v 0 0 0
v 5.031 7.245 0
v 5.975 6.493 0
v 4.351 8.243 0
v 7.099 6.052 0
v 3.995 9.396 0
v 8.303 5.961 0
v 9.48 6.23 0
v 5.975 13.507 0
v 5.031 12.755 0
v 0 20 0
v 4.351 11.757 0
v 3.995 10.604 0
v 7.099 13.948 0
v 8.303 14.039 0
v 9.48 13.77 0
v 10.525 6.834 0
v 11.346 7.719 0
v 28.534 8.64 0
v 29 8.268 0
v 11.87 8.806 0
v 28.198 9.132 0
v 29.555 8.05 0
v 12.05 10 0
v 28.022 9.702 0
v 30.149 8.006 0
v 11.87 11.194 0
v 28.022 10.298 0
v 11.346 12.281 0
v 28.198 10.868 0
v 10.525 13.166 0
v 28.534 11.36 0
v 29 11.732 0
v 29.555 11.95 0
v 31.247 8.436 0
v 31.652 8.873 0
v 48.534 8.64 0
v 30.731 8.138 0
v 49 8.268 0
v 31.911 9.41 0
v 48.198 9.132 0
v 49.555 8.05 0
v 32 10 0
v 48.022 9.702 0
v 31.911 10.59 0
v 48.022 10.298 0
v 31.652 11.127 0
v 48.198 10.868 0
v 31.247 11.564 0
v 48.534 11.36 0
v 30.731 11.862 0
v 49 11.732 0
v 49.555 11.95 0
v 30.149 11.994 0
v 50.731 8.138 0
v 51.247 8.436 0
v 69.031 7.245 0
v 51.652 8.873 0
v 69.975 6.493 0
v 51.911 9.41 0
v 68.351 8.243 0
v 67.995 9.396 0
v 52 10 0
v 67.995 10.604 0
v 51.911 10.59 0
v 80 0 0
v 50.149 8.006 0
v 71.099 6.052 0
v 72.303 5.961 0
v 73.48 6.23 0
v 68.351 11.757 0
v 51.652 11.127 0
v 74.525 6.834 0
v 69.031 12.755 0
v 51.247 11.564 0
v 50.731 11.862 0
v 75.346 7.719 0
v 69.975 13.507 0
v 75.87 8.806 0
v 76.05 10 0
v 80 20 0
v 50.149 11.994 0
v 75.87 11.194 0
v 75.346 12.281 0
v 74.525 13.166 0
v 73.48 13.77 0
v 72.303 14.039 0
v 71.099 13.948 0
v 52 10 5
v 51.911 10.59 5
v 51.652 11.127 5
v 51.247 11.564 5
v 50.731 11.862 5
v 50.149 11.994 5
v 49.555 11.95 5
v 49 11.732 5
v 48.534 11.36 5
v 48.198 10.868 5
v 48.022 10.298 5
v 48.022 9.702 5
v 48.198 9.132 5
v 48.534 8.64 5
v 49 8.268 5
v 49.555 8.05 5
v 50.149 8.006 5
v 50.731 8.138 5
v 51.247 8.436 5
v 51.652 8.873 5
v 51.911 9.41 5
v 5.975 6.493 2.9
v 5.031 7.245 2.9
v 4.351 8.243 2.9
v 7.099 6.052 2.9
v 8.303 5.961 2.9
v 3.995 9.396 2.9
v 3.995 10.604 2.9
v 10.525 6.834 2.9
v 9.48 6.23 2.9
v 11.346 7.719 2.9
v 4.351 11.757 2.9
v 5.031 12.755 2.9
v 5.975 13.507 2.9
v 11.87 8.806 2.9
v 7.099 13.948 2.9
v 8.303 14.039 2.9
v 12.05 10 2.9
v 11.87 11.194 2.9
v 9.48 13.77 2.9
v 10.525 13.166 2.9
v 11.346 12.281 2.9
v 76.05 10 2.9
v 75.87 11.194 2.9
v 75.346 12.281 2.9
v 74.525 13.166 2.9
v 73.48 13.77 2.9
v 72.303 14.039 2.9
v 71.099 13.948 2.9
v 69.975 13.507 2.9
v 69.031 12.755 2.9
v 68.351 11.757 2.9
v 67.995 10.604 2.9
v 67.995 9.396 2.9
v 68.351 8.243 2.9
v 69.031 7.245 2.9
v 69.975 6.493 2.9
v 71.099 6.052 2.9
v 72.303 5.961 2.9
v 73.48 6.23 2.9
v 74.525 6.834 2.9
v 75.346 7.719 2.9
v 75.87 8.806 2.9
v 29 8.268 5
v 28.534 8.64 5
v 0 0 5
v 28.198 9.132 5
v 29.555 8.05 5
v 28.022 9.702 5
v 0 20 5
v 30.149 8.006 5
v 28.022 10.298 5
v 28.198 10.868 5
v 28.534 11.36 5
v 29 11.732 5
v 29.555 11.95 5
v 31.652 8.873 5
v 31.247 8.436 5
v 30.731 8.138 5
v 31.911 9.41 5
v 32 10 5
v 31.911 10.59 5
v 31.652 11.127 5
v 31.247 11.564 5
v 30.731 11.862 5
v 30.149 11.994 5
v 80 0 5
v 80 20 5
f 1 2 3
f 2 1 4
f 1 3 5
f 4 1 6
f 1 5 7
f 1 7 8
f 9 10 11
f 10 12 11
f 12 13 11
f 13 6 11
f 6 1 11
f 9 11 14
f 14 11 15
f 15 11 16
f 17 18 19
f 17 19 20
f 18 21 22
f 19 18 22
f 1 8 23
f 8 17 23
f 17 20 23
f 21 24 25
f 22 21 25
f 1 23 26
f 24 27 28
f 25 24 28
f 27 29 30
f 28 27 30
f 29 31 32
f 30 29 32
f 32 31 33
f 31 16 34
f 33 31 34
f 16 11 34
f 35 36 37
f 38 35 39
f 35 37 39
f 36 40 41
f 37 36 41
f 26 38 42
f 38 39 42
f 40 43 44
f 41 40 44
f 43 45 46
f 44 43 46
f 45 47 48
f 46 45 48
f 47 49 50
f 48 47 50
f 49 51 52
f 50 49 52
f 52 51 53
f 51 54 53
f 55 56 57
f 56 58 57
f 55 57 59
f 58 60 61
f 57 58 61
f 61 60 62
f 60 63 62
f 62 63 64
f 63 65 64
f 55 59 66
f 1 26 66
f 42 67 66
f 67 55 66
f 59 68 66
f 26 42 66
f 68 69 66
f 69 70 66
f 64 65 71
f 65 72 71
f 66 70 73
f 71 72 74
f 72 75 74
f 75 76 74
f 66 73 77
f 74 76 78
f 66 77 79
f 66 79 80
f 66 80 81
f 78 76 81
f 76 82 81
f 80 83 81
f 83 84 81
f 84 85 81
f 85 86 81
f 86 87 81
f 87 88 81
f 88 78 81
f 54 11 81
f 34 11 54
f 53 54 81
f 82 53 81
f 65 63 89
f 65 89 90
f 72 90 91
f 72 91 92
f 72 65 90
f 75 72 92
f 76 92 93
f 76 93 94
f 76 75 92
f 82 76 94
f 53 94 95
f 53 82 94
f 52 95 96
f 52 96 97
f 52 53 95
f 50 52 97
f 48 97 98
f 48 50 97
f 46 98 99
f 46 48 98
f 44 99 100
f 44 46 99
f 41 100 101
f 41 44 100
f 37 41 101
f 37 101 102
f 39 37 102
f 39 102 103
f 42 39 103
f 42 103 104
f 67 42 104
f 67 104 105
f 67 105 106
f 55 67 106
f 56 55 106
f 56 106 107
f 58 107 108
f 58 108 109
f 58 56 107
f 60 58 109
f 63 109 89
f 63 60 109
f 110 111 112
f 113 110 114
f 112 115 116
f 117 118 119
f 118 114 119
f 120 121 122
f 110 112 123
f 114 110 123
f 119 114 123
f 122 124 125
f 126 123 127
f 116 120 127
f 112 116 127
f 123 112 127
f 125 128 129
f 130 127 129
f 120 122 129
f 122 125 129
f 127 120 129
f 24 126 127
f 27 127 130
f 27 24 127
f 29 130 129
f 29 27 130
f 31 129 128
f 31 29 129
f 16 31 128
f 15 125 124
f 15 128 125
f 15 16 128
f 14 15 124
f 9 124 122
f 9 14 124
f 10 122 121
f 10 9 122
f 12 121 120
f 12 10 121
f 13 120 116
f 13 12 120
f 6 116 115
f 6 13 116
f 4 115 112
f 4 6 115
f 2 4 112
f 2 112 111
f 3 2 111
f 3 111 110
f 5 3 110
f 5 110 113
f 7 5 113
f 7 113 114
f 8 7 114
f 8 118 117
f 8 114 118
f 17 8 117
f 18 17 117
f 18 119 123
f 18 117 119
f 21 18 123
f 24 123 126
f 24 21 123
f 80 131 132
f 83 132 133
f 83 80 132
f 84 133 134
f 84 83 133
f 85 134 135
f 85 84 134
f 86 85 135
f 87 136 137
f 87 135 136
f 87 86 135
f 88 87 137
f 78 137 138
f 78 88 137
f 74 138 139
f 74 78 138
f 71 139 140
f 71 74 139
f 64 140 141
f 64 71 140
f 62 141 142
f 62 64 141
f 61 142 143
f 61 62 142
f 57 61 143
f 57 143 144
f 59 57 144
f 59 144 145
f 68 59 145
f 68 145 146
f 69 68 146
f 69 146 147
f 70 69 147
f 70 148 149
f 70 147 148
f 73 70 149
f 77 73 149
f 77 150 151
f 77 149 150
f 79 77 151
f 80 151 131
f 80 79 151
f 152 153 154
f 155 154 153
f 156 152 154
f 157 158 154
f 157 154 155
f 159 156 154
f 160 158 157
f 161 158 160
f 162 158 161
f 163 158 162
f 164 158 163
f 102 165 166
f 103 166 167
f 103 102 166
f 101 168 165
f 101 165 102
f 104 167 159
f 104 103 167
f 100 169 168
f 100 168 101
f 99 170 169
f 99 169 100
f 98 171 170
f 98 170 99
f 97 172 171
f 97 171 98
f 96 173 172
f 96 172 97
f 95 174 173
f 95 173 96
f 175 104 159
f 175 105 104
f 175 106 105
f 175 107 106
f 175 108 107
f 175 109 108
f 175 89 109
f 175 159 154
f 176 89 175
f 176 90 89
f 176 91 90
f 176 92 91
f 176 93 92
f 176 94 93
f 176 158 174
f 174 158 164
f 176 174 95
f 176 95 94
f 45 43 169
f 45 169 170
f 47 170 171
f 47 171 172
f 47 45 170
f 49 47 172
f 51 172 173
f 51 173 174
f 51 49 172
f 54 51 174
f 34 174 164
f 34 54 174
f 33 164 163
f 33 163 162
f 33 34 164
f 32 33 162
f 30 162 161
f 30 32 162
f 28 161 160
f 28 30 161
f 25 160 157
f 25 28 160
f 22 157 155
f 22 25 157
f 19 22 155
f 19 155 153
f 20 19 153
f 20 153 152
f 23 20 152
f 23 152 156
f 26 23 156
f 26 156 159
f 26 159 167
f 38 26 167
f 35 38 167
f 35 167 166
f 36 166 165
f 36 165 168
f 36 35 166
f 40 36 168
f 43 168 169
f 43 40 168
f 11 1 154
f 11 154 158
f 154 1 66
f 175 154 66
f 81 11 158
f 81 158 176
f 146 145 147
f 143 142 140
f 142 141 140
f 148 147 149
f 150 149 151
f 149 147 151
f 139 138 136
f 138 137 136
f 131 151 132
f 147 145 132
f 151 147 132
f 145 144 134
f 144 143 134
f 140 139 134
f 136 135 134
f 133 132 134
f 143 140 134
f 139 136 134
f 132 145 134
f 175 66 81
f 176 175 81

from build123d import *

# Parameters (mm, degrees)
CROQUIS1_W              = 80
CROQUIS1_H              = 20
CROQUIS1_R              = 2
CROQUIS1_R_2            = 4.05
SALIENTE_EXTRUIR2_DEPTH = 5
CROQUIS2_R              = 6
SALIENTE_EXTRUIR3_DEPTH = 2.1


with BuildPart() as part:
    # Croquis1 → Saliente-Extruir2 (new body)
    with BuildSketch(Plane.XY):
        with Locations((40, 10)):
            Rectangle(CROQUIS1_W, CROQUIS1_H)
        with Locations((30, 10)):
            Circle(CROQUIS1_R, mode=Mode.SUBTRACT)
        with Locations((50, 10)):
            Circle(CROQUIS1_R, mode=Mode.SUBTRACT)
        with Locations((8, 10)):
            Circle(CROQUIS1_R_2, mode=Mode.SUBTRACT)
        with Locations((72, 10)):
            Circle(CROQUIS1_R_2, mode=Mode.SUBTRACT)
    extrude(amount=SALIENTE_EXTRUIR2_DEPTH)

    # Croquis2 → Saliente-Extruir3 (add)
    with BuildSketch(Plane.XY.offset(5)):
        with Locations((8, 10)):
            Circle(CROQUIS2_R)
        with Locations((73, 10)):
            Circle(CROQUIS2_R)
    extrude(amount=-SALIENTE_EXTRUIR3_DEPTH)


solid = part.part
